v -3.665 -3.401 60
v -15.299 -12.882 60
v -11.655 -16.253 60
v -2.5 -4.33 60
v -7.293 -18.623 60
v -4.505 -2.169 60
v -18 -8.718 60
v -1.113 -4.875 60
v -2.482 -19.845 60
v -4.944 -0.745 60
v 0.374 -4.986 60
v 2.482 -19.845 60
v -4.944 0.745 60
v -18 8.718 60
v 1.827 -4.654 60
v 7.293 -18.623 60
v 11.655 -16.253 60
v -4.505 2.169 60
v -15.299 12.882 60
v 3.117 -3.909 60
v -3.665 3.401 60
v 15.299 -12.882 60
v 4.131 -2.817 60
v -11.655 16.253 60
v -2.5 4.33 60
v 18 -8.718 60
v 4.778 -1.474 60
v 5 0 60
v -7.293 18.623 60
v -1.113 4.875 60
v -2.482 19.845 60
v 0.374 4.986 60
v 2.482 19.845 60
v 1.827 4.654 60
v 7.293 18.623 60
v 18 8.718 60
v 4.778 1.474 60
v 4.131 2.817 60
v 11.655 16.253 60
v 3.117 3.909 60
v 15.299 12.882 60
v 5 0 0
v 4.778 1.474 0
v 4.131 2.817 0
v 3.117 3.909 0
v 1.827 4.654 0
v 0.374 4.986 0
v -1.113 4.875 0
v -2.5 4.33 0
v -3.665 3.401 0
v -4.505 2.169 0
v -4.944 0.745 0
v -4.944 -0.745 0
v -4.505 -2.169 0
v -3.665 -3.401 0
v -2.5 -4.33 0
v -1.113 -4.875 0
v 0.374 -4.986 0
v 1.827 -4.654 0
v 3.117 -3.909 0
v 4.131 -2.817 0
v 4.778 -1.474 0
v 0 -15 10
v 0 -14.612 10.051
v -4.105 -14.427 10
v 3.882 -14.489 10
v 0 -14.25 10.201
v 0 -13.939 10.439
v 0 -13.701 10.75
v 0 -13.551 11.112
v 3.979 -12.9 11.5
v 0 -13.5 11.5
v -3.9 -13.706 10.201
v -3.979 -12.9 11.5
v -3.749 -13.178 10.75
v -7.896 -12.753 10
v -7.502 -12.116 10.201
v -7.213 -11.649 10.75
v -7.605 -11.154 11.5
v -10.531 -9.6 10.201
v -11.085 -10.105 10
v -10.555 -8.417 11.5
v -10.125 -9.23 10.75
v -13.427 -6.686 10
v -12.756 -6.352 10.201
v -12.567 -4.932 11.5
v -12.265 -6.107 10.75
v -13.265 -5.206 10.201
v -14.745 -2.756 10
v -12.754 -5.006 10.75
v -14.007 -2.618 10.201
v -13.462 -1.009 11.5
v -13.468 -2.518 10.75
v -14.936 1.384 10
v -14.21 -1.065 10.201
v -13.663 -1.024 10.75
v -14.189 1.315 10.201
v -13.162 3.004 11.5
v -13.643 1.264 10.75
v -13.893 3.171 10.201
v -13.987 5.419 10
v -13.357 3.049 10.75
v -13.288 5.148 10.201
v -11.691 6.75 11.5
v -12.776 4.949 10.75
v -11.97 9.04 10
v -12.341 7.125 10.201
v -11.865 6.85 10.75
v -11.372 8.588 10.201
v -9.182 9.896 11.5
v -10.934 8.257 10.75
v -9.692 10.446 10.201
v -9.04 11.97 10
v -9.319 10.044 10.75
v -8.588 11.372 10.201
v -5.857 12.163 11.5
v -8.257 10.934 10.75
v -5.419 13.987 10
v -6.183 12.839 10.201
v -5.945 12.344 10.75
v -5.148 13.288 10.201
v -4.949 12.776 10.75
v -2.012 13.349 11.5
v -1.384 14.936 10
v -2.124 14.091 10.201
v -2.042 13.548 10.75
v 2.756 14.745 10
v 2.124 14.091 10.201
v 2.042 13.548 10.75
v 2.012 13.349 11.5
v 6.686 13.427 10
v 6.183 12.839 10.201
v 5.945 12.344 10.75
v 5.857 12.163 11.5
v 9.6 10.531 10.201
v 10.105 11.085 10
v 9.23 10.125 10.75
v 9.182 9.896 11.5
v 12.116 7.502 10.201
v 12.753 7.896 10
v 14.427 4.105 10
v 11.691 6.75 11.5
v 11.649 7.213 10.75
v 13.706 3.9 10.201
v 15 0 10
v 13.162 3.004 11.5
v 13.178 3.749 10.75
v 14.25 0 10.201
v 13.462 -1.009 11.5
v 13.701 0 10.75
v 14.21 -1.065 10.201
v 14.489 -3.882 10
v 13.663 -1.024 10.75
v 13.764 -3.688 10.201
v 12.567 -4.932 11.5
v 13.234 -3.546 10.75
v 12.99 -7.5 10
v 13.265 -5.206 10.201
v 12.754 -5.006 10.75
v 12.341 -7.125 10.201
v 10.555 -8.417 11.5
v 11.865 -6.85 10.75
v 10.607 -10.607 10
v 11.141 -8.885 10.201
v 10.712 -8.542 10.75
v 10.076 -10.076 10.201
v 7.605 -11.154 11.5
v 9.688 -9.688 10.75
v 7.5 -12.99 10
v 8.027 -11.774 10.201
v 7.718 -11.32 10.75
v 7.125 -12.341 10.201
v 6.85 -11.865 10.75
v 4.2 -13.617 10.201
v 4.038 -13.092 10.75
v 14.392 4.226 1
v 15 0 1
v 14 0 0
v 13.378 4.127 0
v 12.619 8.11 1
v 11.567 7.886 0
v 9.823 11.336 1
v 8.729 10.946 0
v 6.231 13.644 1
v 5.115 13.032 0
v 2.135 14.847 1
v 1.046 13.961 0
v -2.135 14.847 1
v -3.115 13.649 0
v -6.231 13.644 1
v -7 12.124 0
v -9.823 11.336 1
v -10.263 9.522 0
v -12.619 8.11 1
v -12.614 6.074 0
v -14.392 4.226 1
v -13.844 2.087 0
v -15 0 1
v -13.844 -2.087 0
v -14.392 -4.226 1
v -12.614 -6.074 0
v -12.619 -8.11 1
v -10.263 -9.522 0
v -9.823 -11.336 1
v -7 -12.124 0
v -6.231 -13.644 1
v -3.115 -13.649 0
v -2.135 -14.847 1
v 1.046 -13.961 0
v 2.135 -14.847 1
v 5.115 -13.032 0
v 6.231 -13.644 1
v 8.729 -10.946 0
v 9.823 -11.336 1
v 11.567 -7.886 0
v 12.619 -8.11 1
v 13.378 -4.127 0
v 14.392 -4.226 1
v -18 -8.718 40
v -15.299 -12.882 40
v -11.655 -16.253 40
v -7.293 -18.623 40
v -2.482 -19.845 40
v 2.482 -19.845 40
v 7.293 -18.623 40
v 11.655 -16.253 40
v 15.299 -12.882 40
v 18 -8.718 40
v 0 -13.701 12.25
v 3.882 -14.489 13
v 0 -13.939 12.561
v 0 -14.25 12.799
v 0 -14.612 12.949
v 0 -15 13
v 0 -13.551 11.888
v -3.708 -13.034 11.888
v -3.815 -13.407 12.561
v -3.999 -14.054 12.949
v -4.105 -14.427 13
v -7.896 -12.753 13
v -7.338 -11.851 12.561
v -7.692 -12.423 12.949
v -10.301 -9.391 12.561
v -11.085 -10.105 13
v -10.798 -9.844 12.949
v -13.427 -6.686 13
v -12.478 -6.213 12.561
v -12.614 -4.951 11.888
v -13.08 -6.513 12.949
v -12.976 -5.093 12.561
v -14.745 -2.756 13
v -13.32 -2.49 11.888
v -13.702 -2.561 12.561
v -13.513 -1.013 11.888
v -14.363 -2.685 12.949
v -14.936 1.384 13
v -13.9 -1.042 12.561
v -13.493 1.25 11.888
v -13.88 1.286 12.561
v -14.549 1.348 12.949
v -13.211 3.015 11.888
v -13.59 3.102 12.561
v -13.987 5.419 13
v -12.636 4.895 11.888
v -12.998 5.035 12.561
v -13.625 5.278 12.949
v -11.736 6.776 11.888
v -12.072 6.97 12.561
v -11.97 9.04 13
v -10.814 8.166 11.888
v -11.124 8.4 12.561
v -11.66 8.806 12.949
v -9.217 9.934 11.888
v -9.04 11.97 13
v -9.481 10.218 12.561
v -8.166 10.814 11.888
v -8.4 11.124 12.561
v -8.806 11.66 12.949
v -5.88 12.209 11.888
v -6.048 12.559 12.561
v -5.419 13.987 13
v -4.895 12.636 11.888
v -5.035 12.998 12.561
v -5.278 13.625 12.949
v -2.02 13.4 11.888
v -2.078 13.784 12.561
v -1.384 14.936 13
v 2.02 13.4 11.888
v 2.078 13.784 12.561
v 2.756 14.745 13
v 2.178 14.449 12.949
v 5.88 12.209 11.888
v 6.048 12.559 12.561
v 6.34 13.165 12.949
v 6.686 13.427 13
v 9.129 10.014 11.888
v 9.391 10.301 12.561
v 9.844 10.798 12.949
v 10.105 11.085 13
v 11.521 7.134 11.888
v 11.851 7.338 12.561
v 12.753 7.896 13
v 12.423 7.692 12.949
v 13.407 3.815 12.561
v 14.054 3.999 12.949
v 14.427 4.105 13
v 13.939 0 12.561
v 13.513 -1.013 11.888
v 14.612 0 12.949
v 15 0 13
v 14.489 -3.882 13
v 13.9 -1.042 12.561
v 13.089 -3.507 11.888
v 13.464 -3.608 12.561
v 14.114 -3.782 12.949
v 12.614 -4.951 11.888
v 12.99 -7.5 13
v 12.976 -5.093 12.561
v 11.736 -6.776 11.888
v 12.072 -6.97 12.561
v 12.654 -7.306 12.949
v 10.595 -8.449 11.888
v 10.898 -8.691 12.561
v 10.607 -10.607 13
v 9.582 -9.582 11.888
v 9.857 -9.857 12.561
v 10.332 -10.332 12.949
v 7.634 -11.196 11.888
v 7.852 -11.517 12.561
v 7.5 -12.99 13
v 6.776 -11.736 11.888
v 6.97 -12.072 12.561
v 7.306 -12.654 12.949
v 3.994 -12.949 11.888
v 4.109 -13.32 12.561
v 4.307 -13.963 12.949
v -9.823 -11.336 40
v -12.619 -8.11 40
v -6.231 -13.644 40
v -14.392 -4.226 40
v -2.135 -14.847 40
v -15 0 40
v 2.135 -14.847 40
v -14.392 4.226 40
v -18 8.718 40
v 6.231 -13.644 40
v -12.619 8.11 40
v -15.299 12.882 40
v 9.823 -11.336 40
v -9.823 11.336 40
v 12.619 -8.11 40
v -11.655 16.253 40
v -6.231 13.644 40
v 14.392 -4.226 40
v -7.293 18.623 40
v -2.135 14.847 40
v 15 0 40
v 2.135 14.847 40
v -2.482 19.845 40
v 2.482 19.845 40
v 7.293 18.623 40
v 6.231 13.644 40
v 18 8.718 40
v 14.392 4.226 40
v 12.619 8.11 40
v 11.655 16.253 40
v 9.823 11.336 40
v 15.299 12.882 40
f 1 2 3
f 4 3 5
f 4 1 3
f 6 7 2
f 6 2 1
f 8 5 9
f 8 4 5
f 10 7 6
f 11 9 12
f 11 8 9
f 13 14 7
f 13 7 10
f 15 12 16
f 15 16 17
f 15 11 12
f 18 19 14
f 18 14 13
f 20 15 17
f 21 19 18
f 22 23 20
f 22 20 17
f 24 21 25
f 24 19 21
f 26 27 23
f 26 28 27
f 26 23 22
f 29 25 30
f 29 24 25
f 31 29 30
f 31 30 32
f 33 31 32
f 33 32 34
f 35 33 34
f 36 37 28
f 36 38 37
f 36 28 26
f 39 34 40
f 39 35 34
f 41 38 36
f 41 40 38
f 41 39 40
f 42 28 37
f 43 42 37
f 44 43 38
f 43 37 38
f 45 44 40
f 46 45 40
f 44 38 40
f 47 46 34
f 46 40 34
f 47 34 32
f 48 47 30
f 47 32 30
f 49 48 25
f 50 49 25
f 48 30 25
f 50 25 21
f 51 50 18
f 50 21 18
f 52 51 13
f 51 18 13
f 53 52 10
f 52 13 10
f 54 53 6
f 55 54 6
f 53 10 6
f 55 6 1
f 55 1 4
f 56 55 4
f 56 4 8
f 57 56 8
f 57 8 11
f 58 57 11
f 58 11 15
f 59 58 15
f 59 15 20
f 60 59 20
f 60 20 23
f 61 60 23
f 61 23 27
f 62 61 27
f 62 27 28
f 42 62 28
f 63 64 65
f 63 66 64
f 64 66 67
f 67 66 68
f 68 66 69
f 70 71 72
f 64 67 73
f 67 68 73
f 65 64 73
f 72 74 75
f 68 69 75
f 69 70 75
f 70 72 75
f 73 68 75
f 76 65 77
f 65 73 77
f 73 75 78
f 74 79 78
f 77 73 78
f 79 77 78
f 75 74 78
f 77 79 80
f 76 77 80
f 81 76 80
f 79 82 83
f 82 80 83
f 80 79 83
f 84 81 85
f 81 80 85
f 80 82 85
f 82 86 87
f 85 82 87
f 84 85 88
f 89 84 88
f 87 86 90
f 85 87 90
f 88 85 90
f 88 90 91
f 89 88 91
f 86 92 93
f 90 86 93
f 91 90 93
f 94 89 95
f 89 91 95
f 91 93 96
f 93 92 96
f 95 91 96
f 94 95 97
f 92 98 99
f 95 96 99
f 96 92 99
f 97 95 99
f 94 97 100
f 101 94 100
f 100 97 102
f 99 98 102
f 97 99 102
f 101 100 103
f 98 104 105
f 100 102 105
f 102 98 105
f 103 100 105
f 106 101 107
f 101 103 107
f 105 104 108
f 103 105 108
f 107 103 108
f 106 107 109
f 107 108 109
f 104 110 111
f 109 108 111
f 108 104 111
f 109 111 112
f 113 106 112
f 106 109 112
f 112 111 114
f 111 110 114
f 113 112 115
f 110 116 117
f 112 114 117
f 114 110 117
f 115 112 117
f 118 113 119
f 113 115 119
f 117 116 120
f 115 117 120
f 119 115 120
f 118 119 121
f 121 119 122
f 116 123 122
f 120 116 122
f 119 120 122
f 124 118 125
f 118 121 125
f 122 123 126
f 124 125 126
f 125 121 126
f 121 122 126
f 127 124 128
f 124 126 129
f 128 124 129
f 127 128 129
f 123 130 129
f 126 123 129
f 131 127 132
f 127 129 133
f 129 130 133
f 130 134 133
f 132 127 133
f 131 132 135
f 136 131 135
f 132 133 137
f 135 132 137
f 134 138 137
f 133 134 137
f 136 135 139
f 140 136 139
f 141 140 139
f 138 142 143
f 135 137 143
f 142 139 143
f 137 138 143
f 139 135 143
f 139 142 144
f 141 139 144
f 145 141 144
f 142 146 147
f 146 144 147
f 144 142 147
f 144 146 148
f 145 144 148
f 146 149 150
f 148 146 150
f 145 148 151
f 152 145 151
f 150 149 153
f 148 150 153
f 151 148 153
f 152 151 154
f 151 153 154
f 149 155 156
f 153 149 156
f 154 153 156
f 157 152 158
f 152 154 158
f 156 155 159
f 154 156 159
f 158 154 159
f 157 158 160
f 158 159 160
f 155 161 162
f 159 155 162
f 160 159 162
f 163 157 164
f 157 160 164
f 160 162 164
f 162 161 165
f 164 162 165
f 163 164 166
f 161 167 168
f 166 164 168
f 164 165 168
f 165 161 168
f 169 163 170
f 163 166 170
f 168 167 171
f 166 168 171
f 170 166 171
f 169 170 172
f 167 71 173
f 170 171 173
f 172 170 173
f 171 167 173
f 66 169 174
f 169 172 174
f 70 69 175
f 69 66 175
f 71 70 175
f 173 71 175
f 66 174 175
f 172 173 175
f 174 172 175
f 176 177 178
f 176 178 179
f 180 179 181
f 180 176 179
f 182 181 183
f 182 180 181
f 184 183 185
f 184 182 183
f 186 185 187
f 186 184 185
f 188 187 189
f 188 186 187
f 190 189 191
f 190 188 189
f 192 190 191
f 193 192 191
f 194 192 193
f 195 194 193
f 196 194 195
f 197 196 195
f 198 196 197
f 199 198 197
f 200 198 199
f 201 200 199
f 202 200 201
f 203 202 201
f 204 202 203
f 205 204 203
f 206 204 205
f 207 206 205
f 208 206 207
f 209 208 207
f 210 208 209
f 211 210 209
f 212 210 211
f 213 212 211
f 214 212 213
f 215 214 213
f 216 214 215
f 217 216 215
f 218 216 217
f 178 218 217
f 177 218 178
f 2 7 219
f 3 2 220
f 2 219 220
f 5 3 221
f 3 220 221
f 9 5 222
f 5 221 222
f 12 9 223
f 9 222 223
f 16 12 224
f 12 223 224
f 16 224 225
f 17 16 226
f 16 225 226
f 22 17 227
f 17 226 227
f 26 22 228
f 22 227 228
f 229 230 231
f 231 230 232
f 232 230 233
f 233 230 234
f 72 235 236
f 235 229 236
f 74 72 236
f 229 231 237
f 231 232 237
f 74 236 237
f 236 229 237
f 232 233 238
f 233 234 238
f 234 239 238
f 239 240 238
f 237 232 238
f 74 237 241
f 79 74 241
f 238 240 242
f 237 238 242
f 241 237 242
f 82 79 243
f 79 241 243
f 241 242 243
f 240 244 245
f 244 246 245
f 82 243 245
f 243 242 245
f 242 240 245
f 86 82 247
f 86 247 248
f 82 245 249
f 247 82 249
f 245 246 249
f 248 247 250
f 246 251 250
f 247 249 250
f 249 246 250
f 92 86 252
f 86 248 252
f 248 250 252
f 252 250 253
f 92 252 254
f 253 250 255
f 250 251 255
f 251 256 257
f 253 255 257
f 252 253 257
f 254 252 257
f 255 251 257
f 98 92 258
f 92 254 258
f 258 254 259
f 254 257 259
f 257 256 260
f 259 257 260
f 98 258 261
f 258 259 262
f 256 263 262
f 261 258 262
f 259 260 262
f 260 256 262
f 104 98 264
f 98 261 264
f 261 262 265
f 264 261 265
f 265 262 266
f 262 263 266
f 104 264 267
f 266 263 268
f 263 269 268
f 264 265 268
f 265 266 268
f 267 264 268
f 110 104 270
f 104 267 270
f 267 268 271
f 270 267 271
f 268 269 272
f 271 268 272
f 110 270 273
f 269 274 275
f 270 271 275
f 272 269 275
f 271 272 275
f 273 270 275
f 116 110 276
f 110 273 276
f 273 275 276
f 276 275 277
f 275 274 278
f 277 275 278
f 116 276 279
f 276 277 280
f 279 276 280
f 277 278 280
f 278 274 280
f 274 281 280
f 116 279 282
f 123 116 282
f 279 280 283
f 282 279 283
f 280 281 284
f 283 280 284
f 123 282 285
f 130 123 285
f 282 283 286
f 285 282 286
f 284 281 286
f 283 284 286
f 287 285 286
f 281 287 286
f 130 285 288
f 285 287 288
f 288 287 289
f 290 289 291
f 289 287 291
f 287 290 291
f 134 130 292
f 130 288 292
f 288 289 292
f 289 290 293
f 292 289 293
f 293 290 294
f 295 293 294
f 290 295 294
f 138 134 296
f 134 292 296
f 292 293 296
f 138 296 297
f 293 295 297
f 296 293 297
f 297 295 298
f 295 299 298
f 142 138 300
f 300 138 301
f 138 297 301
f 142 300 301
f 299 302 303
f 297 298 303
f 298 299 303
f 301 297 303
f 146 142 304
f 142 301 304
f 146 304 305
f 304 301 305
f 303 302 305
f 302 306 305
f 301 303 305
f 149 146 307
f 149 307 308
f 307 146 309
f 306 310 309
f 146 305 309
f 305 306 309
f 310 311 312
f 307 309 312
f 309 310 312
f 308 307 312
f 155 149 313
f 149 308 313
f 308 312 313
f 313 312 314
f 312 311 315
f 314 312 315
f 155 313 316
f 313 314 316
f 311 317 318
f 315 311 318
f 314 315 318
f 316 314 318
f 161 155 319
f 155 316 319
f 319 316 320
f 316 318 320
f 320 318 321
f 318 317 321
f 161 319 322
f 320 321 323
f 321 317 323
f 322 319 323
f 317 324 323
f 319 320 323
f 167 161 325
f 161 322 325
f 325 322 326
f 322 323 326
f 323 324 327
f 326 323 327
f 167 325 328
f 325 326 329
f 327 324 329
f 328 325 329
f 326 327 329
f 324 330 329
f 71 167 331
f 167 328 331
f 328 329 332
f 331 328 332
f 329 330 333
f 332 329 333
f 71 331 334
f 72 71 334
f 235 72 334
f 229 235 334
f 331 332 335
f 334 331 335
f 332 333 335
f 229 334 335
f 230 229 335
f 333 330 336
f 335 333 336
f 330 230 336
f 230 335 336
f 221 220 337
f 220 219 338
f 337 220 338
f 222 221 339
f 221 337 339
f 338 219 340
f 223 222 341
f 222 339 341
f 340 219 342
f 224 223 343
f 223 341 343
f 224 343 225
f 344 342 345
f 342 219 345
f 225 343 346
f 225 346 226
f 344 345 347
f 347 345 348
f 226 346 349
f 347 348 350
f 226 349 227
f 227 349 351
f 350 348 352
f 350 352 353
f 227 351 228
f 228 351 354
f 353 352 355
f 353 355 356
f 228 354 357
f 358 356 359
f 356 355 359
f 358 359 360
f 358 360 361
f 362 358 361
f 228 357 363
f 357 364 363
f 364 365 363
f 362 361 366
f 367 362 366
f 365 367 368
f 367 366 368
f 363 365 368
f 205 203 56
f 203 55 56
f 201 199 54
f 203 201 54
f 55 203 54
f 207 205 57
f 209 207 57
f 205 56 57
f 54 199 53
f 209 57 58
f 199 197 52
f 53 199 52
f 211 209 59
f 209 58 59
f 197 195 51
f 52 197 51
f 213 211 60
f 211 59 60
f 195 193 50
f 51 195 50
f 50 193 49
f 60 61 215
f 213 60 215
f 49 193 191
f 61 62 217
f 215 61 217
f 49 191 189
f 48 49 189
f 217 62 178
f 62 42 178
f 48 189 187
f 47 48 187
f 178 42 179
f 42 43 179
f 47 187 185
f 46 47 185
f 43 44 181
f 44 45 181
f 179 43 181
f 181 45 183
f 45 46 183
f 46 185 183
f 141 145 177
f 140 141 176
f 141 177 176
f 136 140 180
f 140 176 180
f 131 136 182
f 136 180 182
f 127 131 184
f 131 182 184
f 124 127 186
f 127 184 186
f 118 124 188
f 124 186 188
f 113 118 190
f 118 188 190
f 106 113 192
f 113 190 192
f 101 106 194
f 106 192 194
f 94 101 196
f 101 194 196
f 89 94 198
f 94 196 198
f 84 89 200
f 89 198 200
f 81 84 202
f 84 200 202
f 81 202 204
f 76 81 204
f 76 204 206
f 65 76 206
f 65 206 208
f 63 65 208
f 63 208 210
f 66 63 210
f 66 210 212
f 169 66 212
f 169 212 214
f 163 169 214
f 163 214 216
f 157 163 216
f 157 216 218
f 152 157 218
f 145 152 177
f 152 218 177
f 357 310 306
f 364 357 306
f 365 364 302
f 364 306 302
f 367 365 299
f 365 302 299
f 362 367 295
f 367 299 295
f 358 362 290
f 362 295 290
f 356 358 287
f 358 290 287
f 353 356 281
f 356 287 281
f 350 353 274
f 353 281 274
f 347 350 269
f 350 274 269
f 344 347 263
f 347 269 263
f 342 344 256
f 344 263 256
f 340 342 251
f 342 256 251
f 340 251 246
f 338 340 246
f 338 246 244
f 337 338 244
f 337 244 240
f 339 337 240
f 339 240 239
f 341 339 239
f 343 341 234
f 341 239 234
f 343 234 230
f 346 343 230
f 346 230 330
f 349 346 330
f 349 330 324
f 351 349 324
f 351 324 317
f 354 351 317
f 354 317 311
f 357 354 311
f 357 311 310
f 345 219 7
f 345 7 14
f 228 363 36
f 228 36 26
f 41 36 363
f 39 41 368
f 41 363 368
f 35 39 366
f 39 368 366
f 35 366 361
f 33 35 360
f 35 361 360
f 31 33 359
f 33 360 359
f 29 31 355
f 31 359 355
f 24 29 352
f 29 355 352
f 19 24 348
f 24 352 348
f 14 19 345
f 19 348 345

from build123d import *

# Parameters (mm, degrees)
F0_R     = 15
F1_DEPTH = 40
F2_R     = 20
F4_DEPTH = 20
F5_R     = 5
F6_DEPTH = 60.001
F8_DEPTH = 60.001
F9_R     = 1.5
F11_SIZE = 1


with BuildPart() as f1:
    # F0 (on Top) → F1 (new body)
    with BuildSketch(Plane.XY):
        Circle(F0_R)
    extrude(amount=F1_DEPTH)

    # F2 (on face) → F4 (join, through all)
    with BuildSketch(Plane.XY.offset(40)):
        Circle(F2_R)
    extrude(amount=F4_DEPTH)

    # F5 (on face) → F6 (cut, through all)
    with BuildSketch(Plane.XY.offset(60)):
        Circle(F5_R)
    extrude(amount=-F6_DEPTH, mode=Mode.SUBTRACT)

    # F7 (on face) → F8 (cut, through all)
    with BuildSketch(Plane.XY.offset(60)):
        with BuildLine():
            Line((-18, -8.7177978871), (-18, 0))
            Line((-18, 0), (-18, 8.7177978871))
            ThreePointArc((-18, 8.7177978871), (-20, 0), (-18, -8.7177978871))
        make_face()
        with BuildLine():
            Line((18, 8.7177978871), (18, 0))
            Line((18, 0), (18, -8.7177978871))
            ThreePointArc((18, -8.7177978871), (19.4935886896, -4.472135955), (20, 0))
            ThreePointArc((20, 0), (19.4935886896, 4.472135955), (18, 8.7177978871))
        make_face()
    extrude(amount=-F8_DEPTH, mode=Mode.SUBTRACT)

    # F9 (on Right) → F10 (revolve, cut)
    with BuildSketch(Plane.YZ):
        with Locations((-15, 11.5)):
            Circle(F9_R)
    revolve(axis=Axis((0, 0, 0), (0, 0, -1)), mode=Mode.SUBTRACT)

    # F11
    f11_edges = [f1.edges().sort_by_distance(p)[0] for p in [
        (-15, 0, 0),
    ]]
    chamfer(f11_edges, length=F11_SIZE)


solid = f1.part
